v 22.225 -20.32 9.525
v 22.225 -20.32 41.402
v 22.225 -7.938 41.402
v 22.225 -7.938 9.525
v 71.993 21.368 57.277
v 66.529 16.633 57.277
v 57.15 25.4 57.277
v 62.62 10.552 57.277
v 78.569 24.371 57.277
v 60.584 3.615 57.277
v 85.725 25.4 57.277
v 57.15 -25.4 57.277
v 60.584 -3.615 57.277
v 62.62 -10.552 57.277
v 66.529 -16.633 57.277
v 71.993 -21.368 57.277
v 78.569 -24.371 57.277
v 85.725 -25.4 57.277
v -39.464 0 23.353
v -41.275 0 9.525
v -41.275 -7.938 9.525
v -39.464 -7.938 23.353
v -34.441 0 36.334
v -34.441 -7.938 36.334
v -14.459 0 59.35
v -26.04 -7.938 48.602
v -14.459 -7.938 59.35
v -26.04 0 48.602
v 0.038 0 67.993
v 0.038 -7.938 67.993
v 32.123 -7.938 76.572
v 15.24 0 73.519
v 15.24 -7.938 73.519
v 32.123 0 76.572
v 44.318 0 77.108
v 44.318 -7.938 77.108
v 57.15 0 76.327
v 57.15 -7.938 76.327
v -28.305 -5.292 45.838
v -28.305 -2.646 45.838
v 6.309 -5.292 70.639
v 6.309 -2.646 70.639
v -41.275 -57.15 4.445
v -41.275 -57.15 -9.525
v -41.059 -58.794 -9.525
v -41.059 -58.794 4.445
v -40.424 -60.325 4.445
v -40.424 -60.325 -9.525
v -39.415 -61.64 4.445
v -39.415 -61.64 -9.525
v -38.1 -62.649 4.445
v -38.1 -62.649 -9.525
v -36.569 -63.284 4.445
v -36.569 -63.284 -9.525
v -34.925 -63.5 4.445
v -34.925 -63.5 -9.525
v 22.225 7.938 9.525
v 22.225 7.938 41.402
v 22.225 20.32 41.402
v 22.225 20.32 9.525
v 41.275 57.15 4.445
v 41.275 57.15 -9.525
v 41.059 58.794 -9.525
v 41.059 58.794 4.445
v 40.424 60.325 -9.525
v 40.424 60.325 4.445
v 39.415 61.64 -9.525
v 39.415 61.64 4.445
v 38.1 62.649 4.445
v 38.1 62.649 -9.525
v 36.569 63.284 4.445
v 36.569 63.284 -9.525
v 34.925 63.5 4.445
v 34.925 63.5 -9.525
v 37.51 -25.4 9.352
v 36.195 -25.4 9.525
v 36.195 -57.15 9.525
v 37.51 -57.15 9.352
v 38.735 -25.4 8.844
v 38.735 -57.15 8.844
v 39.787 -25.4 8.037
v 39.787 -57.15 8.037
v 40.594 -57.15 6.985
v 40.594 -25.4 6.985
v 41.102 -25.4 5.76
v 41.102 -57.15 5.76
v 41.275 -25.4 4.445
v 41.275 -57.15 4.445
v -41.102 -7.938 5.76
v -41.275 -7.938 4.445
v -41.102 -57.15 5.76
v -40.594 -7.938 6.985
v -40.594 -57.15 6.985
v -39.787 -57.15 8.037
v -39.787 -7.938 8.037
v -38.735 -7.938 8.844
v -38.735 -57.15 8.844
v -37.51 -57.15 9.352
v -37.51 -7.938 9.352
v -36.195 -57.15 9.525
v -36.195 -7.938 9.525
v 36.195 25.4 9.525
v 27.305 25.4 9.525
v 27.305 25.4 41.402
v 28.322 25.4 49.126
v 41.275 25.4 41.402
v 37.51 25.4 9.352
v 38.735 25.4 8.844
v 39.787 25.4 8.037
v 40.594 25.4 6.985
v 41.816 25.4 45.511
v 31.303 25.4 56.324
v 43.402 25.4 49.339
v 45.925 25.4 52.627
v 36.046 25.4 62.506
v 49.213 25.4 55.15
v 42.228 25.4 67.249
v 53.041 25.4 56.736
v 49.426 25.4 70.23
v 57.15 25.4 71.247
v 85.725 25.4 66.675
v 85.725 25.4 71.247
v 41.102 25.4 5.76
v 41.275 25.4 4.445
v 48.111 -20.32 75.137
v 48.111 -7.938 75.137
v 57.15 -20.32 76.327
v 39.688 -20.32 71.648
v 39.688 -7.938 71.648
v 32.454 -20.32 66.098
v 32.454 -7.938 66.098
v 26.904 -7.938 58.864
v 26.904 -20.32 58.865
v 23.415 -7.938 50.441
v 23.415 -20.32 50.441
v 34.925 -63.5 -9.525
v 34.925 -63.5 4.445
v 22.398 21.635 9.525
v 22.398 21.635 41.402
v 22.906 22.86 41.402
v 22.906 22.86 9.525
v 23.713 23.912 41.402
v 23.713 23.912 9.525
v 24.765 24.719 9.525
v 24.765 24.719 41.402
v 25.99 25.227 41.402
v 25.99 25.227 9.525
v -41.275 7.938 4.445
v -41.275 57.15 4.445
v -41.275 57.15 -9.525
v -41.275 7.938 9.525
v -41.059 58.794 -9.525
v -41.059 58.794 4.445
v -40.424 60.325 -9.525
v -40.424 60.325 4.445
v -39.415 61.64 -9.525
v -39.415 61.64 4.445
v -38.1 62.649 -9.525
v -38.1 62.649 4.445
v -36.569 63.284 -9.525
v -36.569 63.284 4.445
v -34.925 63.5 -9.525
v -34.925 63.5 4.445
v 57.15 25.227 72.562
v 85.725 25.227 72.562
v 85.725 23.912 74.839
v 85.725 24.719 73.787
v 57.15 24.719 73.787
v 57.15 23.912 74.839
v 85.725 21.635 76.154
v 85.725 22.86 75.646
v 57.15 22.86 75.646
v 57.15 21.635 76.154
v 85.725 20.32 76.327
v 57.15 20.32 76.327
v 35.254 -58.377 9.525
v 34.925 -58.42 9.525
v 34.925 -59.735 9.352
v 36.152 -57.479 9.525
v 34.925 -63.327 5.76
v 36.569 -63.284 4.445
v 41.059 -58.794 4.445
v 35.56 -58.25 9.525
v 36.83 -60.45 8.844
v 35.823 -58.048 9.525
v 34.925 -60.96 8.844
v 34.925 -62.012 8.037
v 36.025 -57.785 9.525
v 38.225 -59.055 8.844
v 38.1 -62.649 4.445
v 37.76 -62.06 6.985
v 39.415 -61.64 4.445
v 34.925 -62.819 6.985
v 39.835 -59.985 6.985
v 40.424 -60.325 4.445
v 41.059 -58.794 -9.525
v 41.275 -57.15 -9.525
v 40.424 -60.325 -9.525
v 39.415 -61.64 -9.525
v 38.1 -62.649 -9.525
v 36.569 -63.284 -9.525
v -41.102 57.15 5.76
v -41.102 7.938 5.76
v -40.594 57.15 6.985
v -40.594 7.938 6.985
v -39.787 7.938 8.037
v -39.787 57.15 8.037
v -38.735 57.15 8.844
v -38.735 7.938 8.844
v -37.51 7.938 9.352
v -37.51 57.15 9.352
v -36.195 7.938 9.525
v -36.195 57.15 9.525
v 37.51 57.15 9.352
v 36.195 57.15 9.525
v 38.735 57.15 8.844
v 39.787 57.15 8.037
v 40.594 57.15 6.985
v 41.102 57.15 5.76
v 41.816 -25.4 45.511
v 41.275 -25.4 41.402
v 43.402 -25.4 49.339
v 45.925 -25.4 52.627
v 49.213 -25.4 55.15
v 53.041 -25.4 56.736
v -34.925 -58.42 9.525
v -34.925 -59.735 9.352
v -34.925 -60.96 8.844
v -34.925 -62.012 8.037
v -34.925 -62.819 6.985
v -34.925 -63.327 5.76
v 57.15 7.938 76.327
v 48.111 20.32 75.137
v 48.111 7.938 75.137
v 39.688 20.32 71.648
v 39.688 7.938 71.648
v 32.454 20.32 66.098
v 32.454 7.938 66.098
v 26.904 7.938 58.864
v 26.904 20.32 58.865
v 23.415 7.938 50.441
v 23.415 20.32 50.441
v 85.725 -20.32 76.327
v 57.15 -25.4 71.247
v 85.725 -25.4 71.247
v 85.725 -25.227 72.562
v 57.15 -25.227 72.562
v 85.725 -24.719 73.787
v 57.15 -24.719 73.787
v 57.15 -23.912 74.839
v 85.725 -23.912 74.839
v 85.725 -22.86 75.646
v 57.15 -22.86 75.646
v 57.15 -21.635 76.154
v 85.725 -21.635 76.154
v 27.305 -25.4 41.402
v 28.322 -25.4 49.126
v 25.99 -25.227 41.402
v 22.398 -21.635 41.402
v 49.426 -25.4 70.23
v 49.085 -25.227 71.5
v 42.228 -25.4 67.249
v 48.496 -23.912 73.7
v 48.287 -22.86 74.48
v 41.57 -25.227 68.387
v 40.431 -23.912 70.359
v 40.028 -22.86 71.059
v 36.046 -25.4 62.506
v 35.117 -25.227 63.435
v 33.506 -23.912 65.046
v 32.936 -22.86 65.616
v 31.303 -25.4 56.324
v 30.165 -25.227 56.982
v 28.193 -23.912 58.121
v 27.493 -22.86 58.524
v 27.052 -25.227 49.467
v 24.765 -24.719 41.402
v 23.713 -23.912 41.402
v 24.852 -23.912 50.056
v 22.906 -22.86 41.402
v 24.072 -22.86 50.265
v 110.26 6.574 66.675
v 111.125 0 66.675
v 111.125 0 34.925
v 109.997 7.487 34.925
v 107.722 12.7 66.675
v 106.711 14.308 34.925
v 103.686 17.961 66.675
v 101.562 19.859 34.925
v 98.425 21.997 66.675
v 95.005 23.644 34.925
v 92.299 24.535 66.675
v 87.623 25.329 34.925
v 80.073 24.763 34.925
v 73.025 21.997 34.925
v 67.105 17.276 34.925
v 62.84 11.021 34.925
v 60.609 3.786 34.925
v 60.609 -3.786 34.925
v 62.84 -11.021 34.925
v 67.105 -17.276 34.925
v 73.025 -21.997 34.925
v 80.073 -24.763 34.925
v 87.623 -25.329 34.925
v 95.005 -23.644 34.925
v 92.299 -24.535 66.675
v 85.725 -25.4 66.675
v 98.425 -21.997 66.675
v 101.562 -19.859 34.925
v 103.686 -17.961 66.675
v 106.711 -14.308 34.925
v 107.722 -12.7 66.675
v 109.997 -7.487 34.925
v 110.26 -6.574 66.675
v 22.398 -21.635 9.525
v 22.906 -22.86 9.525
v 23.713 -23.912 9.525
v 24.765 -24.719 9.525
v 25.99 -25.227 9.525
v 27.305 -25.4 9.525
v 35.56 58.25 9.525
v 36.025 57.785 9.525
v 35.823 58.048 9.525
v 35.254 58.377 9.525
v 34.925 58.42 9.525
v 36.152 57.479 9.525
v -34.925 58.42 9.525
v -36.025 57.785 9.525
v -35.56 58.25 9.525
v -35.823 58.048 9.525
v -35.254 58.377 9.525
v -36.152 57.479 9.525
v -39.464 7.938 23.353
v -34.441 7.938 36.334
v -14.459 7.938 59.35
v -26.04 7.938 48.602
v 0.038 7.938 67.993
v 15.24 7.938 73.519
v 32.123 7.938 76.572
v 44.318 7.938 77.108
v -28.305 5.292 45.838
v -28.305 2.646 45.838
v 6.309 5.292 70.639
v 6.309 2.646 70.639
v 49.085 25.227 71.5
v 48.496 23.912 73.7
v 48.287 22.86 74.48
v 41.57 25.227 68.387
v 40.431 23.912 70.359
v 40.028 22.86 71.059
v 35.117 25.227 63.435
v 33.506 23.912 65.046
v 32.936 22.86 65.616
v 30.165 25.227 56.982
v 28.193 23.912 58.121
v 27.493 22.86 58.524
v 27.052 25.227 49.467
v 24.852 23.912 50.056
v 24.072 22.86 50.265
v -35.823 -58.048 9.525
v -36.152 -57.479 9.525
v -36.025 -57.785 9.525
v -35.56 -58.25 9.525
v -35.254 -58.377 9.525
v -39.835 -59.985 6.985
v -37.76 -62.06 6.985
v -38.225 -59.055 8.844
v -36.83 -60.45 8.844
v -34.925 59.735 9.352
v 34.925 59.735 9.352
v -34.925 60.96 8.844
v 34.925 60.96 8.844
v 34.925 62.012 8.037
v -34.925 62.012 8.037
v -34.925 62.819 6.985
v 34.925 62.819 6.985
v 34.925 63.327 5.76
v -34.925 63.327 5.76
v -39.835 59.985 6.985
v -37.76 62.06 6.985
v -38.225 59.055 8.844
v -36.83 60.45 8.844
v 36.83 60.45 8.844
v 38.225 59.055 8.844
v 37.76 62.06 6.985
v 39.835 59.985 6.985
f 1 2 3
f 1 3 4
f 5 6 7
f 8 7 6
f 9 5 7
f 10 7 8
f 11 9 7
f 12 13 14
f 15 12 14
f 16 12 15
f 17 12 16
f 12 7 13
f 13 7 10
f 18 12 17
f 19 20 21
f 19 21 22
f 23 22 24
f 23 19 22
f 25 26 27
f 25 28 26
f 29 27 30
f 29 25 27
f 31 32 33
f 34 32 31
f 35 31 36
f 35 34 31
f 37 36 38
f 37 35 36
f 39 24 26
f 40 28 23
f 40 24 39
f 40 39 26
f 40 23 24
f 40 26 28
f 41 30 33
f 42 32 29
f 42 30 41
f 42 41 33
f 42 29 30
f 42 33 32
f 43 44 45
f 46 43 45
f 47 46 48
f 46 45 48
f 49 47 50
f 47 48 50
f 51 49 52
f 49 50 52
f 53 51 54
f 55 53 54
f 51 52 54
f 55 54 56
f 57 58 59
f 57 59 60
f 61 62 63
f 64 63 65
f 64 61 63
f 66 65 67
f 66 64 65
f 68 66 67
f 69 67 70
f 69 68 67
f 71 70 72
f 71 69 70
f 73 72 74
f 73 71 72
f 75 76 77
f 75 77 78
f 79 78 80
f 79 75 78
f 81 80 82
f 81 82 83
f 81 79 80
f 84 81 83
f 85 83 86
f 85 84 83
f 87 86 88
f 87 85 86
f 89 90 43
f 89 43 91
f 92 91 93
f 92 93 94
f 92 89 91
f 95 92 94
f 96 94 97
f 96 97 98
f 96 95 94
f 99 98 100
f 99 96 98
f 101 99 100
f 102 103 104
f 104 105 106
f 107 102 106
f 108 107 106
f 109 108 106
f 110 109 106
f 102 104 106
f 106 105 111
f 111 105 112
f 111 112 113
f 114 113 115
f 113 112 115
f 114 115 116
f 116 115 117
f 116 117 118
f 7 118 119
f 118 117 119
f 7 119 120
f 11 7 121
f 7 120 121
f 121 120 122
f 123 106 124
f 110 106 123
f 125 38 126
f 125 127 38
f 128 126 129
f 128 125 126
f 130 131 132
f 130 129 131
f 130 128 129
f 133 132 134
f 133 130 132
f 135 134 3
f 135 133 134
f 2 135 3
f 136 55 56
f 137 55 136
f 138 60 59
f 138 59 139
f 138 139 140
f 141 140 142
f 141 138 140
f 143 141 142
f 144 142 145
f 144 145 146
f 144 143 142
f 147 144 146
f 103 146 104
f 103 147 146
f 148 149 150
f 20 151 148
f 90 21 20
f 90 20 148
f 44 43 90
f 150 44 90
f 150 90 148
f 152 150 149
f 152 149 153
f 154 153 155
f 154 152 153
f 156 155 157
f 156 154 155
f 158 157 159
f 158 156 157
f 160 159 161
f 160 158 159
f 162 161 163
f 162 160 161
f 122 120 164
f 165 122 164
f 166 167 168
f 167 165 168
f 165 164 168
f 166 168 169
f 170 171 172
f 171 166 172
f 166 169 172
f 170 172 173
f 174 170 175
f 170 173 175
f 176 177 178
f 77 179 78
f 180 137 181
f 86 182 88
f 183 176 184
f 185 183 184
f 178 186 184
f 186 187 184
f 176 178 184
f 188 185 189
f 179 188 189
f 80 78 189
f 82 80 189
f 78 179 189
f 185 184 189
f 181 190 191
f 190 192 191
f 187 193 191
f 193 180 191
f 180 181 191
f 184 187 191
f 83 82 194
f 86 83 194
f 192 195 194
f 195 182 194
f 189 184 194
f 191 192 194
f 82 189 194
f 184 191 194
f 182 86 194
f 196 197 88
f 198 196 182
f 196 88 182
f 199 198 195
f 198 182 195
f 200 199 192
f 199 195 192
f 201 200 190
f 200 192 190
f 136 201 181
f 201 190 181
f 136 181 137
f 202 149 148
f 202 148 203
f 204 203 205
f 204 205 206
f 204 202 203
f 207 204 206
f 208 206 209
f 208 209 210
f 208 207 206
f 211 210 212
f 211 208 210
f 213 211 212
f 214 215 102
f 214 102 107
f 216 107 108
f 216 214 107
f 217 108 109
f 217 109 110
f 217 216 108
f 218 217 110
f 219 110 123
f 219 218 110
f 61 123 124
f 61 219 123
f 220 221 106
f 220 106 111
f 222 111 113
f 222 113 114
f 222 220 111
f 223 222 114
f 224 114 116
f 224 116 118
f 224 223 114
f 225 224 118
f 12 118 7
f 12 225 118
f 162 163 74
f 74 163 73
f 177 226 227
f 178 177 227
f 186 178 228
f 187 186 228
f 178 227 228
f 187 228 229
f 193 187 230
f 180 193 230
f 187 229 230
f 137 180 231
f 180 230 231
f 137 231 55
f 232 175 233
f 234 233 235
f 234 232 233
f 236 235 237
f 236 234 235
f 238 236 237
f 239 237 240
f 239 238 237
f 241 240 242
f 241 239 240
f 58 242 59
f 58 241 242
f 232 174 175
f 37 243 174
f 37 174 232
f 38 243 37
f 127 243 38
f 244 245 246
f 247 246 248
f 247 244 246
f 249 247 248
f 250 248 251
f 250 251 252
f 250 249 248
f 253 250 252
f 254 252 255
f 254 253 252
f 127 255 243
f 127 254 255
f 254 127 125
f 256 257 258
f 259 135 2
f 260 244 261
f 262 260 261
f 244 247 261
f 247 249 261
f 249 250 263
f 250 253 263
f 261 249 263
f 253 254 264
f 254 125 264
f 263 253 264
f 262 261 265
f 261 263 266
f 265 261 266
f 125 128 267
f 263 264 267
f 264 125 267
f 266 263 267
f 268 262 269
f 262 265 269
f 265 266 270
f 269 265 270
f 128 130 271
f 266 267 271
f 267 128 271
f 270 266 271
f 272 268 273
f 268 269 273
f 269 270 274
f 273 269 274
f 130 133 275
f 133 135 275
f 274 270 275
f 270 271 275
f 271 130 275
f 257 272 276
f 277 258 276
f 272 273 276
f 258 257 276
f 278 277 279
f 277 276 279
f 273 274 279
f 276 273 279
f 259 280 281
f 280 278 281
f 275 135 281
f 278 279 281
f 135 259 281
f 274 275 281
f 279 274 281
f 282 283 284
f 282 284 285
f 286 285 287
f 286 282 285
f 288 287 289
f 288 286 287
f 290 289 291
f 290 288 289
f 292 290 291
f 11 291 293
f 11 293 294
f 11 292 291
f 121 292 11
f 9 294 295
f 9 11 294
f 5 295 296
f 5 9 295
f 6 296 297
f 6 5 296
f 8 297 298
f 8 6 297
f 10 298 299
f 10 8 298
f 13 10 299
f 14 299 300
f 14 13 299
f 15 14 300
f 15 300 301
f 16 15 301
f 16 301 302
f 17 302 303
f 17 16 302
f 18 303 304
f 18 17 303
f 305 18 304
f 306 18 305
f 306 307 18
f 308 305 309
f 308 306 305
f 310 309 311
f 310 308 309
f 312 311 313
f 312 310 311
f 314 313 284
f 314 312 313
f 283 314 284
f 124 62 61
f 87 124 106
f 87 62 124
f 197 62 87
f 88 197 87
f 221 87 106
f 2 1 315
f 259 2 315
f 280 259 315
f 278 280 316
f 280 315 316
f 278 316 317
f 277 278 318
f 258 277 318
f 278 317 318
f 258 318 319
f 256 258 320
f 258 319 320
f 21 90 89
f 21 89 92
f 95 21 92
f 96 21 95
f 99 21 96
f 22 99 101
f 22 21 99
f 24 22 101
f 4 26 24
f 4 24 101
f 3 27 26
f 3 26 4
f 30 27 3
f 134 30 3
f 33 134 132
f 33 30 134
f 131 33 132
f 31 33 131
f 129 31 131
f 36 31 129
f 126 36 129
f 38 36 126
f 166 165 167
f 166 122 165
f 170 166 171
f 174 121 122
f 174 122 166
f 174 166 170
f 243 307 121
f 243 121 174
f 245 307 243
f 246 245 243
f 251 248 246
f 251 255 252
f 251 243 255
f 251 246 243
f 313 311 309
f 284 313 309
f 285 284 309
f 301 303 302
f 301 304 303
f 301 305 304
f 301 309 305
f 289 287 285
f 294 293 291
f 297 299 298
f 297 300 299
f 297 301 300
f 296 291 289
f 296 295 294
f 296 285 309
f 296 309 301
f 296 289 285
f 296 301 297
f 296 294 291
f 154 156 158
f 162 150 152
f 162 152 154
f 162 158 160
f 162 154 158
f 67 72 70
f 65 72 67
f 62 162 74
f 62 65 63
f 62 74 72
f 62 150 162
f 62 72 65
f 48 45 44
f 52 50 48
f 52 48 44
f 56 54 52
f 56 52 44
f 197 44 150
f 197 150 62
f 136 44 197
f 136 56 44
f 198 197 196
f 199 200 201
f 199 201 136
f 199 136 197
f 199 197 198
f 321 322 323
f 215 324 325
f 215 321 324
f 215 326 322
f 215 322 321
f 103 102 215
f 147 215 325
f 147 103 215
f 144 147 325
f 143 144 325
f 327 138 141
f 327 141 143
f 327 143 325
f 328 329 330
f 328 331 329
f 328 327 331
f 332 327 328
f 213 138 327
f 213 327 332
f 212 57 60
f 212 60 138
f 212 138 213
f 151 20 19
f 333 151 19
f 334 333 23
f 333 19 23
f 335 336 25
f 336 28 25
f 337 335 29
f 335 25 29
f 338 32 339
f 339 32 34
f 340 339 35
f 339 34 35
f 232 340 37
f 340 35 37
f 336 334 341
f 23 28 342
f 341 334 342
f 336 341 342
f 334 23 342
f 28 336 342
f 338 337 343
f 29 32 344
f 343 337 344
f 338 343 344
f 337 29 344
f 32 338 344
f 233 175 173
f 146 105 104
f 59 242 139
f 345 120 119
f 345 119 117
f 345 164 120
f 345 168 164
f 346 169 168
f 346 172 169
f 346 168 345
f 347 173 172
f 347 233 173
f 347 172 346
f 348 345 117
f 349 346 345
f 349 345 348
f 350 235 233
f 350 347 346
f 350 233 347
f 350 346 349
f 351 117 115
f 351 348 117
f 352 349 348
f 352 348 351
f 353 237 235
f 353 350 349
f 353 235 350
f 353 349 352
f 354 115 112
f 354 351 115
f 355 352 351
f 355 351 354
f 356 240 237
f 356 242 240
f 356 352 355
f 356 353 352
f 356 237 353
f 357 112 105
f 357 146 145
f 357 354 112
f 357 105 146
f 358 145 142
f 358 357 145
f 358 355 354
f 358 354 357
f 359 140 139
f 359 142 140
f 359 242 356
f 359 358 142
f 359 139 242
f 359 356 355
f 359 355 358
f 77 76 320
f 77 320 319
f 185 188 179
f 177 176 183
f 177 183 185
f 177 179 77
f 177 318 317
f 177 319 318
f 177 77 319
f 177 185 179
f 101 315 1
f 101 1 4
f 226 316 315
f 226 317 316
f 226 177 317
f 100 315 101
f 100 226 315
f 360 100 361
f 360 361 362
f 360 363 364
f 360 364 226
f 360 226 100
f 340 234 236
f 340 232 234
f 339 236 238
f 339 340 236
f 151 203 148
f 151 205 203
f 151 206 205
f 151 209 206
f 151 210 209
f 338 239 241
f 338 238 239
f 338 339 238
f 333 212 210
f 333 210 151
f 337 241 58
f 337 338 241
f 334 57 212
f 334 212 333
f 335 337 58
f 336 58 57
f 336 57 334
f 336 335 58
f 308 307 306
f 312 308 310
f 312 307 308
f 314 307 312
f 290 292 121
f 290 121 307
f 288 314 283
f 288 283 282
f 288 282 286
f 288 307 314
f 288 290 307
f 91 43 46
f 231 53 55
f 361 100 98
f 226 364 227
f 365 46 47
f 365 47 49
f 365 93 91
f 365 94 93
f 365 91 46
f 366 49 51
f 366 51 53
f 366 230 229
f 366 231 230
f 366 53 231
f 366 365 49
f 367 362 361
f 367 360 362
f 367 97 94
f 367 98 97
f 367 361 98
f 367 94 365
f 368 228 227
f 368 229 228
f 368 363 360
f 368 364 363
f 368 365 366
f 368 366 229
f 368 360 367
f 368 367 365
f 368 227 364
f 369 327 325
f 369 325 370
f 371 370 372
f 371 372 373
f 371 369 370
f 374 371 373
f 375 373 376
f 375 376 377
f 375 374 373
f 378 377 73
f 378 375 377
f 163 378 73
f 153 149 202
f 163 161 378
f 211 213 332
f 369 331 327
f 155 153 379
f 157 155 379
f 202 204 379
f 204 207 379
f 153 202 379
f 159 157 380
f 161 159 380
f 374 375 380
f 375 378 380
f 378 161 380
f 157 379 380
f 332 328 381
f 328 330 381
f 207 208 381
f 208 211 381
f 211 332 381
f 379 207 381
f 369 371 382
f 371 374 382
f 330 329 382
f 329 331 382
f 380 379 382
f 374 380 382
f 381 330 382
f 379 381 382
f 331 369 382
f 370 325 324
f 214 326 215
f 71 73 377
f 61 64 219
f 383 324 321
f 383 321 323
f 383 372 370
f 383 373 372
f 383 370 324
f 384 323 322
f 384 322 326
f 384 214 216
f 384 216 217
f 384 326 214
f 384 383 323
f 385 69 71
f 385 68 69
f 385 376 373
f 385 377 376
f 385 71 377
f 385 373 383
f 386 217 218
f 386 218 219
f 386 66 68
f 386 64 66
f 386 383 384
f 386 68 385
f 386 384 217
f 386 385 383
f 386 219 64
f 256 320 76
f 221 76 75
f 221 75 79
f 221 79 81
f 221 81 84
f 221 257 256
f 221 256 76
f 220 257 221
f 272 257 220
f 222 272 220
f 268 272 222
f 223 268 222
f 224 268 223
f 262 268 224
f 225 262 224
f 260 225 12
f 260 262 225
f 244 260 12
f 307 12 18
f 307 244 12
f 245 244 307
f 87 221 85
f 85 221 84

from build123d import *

# Parameters (mm, degrees)
F1_DEPTH     = 63.5
F0_W         = 25.4
F0_H         = 9.398
F2_DEPTH     = 25.4
F3_DEPTH     = 7.9375
F5_R         = 6.35
F6_T1_DEPTH  = 41.275
F6_T3_DEPTH  = 69.85
F6_T5_DEPTH  = 49.2125
F6_T7_DEPTH  = 49.2125
F6_T9_DEPTH  = 31.75
F6_T11_DEPTH = 31.75
F6_T13_DEPTH = 31.877
F6_T16_ANGLE = 90
F6_T18_ANGLE = 90
F6_T20_ANGLE = 90
F6_T22_ANGLE = 90
F6_T24_ANGLE = 90
F6_T26_ANGLE = 90


# Not quite as in the source:
# - a fillet or chamfer that OpenCascade refuses, or shapes differently, is made with other operations: its cross-section is extruded or revolved along the edge and cut away or added


with BuildPart() as f1:
    # F0 (on Front) → F1 (new body, symmetric)
    with BuildSketch(Plane.XZ):
        Polygon((-41.275, 9.525), (-41.275, -9.525), (41.275, -9.525), (41.275, 9.525), (22.225, 9.525), align=None)
    extrude(amount=F1_DEPTH, both=True)

    # F0 (on Front) → F2 (join, symmetric)
    with BuildSketch(Plane.XZ):
        with BuildLine():
            Line((22.225, 9.525), (41.275, 9.525))
            Line((41.275, 9.525), (41.275, 41.402))
            ThreePointArc((41.275, 41.402), (45.9246798487, 52.6273201513), (57.15, 57.277))
            Line((57.15, 57.277), (60.325, 57.277))
            Line((60.325, 57.277), (60.325, 66.675))
            Line((60.325, 66.675), (85.725, 66.675))
            Line((85.725, 66.675), (85.725, 76.327))
            Line((85.725, 76.327), (57.15, 76.327))
            ThreePointArc((57.15, 76.327), (32.4542956671, 66.0977043329), (22.225, 41.402))
            Line((22.225, 41.402), (22.225, 9.525))
        make_face()
        with Locations((73.025, 61.976)):
            Rectangle(F0_W, F0_H)
    extrude(amount=F2_DEPTH, both=True)

    # F0 (on Front) → F3 (join, symmetric)
    with BuildSketch(Plane.XZ):
        with BuildLine():
            add(Edge.make_bspline(
                [(-41.275, 9.525), (-40.9312584529, 49.0607376979), (0, 82.7295482159), (57.15, 76.327)],
                knots=[0, 0, 0, 0, 118.9537213752, 118.9537213752, 118.9537213752, 118.9537213752], degree=3))
            Line((-41.275, 9.525), (22.225, 9.525))
            Line((22.225, 9.525), (22.225, 41.402))
            ThreePointArc((22.225, 41.402), (32.4542956671, 66.0977043329), (57.15, 76.327))
        make_face()
    extrude(amount=F3_DEPTH, both=True)

    # F0 (on Front) → F4 (revolve)
    with BuildSketch(Plane.XZ):
        Polygon((111.125, 66.675), (85.725, 66.675), (85.725, 57.277), (85.725, 34.925), (111.125, 34.925), align=None)
    revolve(axis=Axis((85.725, 0, 55.626), (0, 0, 1)))

    # F5
    f5_edges = [f1.edges().sort_by_distance(p)[0] for p in [
        (41.275, 63.5, 0),
        (-41.275, 63.5, 0),
        (-41.275, -63.5, 0),
        (41.275, -63.5, 0),
    ]]
    fillet(f5_edges, radius=F5_R)

    # F6: fillet of radius 5.08 on 16 edges, made by hand

    # F6_s2 → F6_t1 (cut)
    with BuildSketch(Plane.YZ.offset(57.15)):
        with BuildLine():
            ThreePointArc((25.4, 71.247), (23.9121024484, 74.8391024484), (20.32, 76.327))
            Line((20.32, 76.327), (25.4, 76.327))
            Line((25.4, 76.327), (25.4, 71.247))
        make_face()
        with BuildLine():
            ThreePointArc((-25.4, 71.247), (-23.9121024484, 74.8391024484), (-20.32, 76.327))
            Line((-20.32, 76.327), (-25.4, 76.327))
            Line((-25.4, 76.327), (-25.4, 71.247))
        make_face()
    extrude(amount=F6_T1_DEPTH, mode=Mode.SUBTRACT)

    # F6_s4 → F6_t3 (cut)
    with BuildSketch(Plane.YZ.offset(-34.925)):
        with BuildLine():
            ThreePointArc((-58.42, 9.525), (-62.0121024484, 8.0371024484), (-63.5, 4.445))
            Line((-63.5, 4.445), (-63.5, 9.525))
            Line((-63.5, 9.525), (-58.42, 9.525))
        make_face()
        with BuildLine():
            ThreePointArc((58.42, 9.525), (62.0121024484, 8.0371024484), (63.5, 4.445))
            Line((63.5, 4.445), (63.5, 9.525))
            Line((63.5, 9.525), (58.42, 9.525))
        make_face()
    extrude(amount=F6_T3_DEPTH, mode=Mode.SUBTRACT)

    # F6_s6 → F6_t5 (cut)
    with BuildSketch(Plane.XZ.offset(-57.15)):
        with BuildLine():
            ThreePointArc((-41.275, 4.445), (-39.7871024484, 8.0371024484), (-36.195, 9.525))
            Line((-36.195, 9.525), (-41.275, 9.525))
            Line((-41.275, 9.525), (-41.275, 4.445))
        make_face()
    extrude(amount=F6_T5_DEPTH, mode=Mode.SUBTRACT)

    # F6_s8 → F6_t7 (cut)
    with BuildSketch(Plane.XZ.offset(7.9375)):
        with BuildLine():
            ThreePointArc((-41.275, 4.445), (-39.7871024484, 8.0371024484), (-36.195, 9.525))
            Line((-36.195, 9.525), (-41.275, 9.525))
            Line((-41.275, 9.525), (-41.275, 4.445))
        make_face()
    extrude(amount=F6_T7_DEPTH, mode=Mode.SUBTRACT)

    # F6_s10 → F6_t9 (cut)
    with BuildSketch(Plane.XZ.offset(-57.15)):
        with BuildLine():
            ThreePointArc((36.195, 9.525), (39.7871024484, 8.0371024484), (41.275, 4.445))
            Line((41.275, 4.445), (41.275, 9.525))
            Line((41.275, 9.525), (36.195, 9.525))
        make_face()
    extrude(amount=F6_T9_DEPTH, mode=Mode.SUBTRACT)

    # F6_s12 → F6_t11 (cut)
    with BuildSketch(Plane.XZ.offset(25.4)):
        with BuildLine():
            ThreePointArc((36.195, 9.525), (39.7871024484, 8.0371024484), (41.275, 4.445))
            Line((41.275, 4.445), (41.275, 9.525))
            Line((41.275, 9.525), (36.195, 9.525))
        make_face()
    extrude(amount=F6_T11_DEPTH, mode=Mode.SUBTRACT)

    # F6_s14 → F6_t13 (cut)
    with BuildSketch(Plane.XY.offset(9.525)):
        with BuildLine():
            ThreePointArc((22.225, 20.32), (23.7128975516, 23.9121024484), (27.305, 25.4))
            Line((27.305, 25.4), (22.225, 25.4))
            Line((22.225, 25.4), (22.225, 20.32))
        make_face()
        with BuildLine():
            ThreePointArc((22.225, -20.32), (23.7128975516, -23.9121024484), (27.305, -25.4))
            Line((27.305, -25.4), (22.225, -25.4))
            Line((22.225, -25.4), (22.225, -20.32))
        make_face()
    extrude(amount=F6_T13_DEPTH, mode=Mode.SUBTRACT)

    # F6_s15 → F6_t16 (revolve, cut)
    with BuildSketch(Plane.XZ.offset(-57.15)):
        with BuildLine():
            ThreePointArc((-41.275, 4.445), (-39.7871024484, 8.0371024484), (-36.195, 9.525))
            Line((-36.195, 9.525), (-41.275, 9.525))
            Line((-41.275, 9.525), (-41.275, 4.445))
        make_face()
    revolve(axis=Axis((-34.925, 57.15, 9.525), (0, 0, -1)), revolution_arc=F6_T16_ANGLE, mode=Mode.SUBTRACT)

    # F6_s17 → F6_t18 (revolve, cut)
    with BuildSketch(Plane.XZ.offset(57.15)):
        with BuildLine():
            ThreePointArc((-41.275, 4.445), (-39.7871024484, 8.0371024484), (-36.195, 9.525))
            Line((-36.195, 9.525), (-41.275, 9.525))
            Line((-41.275, 9.525), (-41.275, 4.445))
        make_face()
    revolve(axis=Axis((-34.925, -57.15, 9.525), (0, 0, 1)), revolution_arc=F6_T18_ANGLE, mode=Mode.SUBTRACT)

    # F6_s19 → F6_t20 (revolve, cut)
    with BuildSketch(Plane.YZ.offset(34.925)):
        with BuildLine():
            ThreePointArc((58.42, 9.525), (62.0121024484, 8.0371024484), (63.5, 4.445))
            Line((63.5, 4.445), (63.5, 9.525))
            Line((63.5, 9.525), (58.42, 9.525))
        make_face()
    revolve(axis=Axis((34.925, 57.15, 9.525), (0, 0, -1)), revolution_arc=F6_T20_ANGLE, mode=Mode.SUBTRACT)

    # F6_s21 → F6_t22 (revolve, cut)
    with BuildSketch(Plane.YZ.offset(34.925)):
        with BuildLine():
            ThreePointArc((-58.42, 9.525), (-62.0121024484, 8.0371024484), (-63.5, 4.445))
            Line((-63.5, 4.445), (-63.5, 9.525))
            Line((-63.5, 9.525), (-58.42, 9.525))
        make_face()
    revolve(axis=Axis((34.925, -57.15, 9.525), (0, 0, 1)), revolution_arc=F6_T22_ANGLE, mode=Mode.SUBTRACT)

    # F6_s23 → F6_t24 (revolve, cut)
    with BuildSketch(Plane.YZ.offset(57.15)):
        with BuildLine():
            ThreePointArc((25.4, 71.247), (23.9121024484, 74.8391024484), (20.32, 76.327))
            Line((20.32, 76.327), (25.4, 76.327))
            Line((25.4, 76.327), (25.4, 71.247))
        make_face()
    revolve(axis=Axis((57.15, 25.4, 41.402), (0, -1, 0)), revolution_arc=F6_T24_ANGLE, mode=Mode.SUBTRACT)

    # F6_s25 → F6_t26 (revolve, cut)
    with BuildSketch(Plane.YZ.offset(57.15)):
        with BuildLine():
            ThreePointArc((-25.4, 71.247), (-23.9121024484, 74.8391024484), (-20.32, 76.327))
            Line((-20.32, 76.327), (-25.4, 76.327))
            Line((-25.4, 76.327), (-25.4, 71.247))
        make_face()
    revolve(axis=Axis((57.15, -25.4, 41.402), (0, -1, 0)), revolution_arc=F6_T26_ANGLE, mode=Mode.SUBTRACT)


solid = f1.part
